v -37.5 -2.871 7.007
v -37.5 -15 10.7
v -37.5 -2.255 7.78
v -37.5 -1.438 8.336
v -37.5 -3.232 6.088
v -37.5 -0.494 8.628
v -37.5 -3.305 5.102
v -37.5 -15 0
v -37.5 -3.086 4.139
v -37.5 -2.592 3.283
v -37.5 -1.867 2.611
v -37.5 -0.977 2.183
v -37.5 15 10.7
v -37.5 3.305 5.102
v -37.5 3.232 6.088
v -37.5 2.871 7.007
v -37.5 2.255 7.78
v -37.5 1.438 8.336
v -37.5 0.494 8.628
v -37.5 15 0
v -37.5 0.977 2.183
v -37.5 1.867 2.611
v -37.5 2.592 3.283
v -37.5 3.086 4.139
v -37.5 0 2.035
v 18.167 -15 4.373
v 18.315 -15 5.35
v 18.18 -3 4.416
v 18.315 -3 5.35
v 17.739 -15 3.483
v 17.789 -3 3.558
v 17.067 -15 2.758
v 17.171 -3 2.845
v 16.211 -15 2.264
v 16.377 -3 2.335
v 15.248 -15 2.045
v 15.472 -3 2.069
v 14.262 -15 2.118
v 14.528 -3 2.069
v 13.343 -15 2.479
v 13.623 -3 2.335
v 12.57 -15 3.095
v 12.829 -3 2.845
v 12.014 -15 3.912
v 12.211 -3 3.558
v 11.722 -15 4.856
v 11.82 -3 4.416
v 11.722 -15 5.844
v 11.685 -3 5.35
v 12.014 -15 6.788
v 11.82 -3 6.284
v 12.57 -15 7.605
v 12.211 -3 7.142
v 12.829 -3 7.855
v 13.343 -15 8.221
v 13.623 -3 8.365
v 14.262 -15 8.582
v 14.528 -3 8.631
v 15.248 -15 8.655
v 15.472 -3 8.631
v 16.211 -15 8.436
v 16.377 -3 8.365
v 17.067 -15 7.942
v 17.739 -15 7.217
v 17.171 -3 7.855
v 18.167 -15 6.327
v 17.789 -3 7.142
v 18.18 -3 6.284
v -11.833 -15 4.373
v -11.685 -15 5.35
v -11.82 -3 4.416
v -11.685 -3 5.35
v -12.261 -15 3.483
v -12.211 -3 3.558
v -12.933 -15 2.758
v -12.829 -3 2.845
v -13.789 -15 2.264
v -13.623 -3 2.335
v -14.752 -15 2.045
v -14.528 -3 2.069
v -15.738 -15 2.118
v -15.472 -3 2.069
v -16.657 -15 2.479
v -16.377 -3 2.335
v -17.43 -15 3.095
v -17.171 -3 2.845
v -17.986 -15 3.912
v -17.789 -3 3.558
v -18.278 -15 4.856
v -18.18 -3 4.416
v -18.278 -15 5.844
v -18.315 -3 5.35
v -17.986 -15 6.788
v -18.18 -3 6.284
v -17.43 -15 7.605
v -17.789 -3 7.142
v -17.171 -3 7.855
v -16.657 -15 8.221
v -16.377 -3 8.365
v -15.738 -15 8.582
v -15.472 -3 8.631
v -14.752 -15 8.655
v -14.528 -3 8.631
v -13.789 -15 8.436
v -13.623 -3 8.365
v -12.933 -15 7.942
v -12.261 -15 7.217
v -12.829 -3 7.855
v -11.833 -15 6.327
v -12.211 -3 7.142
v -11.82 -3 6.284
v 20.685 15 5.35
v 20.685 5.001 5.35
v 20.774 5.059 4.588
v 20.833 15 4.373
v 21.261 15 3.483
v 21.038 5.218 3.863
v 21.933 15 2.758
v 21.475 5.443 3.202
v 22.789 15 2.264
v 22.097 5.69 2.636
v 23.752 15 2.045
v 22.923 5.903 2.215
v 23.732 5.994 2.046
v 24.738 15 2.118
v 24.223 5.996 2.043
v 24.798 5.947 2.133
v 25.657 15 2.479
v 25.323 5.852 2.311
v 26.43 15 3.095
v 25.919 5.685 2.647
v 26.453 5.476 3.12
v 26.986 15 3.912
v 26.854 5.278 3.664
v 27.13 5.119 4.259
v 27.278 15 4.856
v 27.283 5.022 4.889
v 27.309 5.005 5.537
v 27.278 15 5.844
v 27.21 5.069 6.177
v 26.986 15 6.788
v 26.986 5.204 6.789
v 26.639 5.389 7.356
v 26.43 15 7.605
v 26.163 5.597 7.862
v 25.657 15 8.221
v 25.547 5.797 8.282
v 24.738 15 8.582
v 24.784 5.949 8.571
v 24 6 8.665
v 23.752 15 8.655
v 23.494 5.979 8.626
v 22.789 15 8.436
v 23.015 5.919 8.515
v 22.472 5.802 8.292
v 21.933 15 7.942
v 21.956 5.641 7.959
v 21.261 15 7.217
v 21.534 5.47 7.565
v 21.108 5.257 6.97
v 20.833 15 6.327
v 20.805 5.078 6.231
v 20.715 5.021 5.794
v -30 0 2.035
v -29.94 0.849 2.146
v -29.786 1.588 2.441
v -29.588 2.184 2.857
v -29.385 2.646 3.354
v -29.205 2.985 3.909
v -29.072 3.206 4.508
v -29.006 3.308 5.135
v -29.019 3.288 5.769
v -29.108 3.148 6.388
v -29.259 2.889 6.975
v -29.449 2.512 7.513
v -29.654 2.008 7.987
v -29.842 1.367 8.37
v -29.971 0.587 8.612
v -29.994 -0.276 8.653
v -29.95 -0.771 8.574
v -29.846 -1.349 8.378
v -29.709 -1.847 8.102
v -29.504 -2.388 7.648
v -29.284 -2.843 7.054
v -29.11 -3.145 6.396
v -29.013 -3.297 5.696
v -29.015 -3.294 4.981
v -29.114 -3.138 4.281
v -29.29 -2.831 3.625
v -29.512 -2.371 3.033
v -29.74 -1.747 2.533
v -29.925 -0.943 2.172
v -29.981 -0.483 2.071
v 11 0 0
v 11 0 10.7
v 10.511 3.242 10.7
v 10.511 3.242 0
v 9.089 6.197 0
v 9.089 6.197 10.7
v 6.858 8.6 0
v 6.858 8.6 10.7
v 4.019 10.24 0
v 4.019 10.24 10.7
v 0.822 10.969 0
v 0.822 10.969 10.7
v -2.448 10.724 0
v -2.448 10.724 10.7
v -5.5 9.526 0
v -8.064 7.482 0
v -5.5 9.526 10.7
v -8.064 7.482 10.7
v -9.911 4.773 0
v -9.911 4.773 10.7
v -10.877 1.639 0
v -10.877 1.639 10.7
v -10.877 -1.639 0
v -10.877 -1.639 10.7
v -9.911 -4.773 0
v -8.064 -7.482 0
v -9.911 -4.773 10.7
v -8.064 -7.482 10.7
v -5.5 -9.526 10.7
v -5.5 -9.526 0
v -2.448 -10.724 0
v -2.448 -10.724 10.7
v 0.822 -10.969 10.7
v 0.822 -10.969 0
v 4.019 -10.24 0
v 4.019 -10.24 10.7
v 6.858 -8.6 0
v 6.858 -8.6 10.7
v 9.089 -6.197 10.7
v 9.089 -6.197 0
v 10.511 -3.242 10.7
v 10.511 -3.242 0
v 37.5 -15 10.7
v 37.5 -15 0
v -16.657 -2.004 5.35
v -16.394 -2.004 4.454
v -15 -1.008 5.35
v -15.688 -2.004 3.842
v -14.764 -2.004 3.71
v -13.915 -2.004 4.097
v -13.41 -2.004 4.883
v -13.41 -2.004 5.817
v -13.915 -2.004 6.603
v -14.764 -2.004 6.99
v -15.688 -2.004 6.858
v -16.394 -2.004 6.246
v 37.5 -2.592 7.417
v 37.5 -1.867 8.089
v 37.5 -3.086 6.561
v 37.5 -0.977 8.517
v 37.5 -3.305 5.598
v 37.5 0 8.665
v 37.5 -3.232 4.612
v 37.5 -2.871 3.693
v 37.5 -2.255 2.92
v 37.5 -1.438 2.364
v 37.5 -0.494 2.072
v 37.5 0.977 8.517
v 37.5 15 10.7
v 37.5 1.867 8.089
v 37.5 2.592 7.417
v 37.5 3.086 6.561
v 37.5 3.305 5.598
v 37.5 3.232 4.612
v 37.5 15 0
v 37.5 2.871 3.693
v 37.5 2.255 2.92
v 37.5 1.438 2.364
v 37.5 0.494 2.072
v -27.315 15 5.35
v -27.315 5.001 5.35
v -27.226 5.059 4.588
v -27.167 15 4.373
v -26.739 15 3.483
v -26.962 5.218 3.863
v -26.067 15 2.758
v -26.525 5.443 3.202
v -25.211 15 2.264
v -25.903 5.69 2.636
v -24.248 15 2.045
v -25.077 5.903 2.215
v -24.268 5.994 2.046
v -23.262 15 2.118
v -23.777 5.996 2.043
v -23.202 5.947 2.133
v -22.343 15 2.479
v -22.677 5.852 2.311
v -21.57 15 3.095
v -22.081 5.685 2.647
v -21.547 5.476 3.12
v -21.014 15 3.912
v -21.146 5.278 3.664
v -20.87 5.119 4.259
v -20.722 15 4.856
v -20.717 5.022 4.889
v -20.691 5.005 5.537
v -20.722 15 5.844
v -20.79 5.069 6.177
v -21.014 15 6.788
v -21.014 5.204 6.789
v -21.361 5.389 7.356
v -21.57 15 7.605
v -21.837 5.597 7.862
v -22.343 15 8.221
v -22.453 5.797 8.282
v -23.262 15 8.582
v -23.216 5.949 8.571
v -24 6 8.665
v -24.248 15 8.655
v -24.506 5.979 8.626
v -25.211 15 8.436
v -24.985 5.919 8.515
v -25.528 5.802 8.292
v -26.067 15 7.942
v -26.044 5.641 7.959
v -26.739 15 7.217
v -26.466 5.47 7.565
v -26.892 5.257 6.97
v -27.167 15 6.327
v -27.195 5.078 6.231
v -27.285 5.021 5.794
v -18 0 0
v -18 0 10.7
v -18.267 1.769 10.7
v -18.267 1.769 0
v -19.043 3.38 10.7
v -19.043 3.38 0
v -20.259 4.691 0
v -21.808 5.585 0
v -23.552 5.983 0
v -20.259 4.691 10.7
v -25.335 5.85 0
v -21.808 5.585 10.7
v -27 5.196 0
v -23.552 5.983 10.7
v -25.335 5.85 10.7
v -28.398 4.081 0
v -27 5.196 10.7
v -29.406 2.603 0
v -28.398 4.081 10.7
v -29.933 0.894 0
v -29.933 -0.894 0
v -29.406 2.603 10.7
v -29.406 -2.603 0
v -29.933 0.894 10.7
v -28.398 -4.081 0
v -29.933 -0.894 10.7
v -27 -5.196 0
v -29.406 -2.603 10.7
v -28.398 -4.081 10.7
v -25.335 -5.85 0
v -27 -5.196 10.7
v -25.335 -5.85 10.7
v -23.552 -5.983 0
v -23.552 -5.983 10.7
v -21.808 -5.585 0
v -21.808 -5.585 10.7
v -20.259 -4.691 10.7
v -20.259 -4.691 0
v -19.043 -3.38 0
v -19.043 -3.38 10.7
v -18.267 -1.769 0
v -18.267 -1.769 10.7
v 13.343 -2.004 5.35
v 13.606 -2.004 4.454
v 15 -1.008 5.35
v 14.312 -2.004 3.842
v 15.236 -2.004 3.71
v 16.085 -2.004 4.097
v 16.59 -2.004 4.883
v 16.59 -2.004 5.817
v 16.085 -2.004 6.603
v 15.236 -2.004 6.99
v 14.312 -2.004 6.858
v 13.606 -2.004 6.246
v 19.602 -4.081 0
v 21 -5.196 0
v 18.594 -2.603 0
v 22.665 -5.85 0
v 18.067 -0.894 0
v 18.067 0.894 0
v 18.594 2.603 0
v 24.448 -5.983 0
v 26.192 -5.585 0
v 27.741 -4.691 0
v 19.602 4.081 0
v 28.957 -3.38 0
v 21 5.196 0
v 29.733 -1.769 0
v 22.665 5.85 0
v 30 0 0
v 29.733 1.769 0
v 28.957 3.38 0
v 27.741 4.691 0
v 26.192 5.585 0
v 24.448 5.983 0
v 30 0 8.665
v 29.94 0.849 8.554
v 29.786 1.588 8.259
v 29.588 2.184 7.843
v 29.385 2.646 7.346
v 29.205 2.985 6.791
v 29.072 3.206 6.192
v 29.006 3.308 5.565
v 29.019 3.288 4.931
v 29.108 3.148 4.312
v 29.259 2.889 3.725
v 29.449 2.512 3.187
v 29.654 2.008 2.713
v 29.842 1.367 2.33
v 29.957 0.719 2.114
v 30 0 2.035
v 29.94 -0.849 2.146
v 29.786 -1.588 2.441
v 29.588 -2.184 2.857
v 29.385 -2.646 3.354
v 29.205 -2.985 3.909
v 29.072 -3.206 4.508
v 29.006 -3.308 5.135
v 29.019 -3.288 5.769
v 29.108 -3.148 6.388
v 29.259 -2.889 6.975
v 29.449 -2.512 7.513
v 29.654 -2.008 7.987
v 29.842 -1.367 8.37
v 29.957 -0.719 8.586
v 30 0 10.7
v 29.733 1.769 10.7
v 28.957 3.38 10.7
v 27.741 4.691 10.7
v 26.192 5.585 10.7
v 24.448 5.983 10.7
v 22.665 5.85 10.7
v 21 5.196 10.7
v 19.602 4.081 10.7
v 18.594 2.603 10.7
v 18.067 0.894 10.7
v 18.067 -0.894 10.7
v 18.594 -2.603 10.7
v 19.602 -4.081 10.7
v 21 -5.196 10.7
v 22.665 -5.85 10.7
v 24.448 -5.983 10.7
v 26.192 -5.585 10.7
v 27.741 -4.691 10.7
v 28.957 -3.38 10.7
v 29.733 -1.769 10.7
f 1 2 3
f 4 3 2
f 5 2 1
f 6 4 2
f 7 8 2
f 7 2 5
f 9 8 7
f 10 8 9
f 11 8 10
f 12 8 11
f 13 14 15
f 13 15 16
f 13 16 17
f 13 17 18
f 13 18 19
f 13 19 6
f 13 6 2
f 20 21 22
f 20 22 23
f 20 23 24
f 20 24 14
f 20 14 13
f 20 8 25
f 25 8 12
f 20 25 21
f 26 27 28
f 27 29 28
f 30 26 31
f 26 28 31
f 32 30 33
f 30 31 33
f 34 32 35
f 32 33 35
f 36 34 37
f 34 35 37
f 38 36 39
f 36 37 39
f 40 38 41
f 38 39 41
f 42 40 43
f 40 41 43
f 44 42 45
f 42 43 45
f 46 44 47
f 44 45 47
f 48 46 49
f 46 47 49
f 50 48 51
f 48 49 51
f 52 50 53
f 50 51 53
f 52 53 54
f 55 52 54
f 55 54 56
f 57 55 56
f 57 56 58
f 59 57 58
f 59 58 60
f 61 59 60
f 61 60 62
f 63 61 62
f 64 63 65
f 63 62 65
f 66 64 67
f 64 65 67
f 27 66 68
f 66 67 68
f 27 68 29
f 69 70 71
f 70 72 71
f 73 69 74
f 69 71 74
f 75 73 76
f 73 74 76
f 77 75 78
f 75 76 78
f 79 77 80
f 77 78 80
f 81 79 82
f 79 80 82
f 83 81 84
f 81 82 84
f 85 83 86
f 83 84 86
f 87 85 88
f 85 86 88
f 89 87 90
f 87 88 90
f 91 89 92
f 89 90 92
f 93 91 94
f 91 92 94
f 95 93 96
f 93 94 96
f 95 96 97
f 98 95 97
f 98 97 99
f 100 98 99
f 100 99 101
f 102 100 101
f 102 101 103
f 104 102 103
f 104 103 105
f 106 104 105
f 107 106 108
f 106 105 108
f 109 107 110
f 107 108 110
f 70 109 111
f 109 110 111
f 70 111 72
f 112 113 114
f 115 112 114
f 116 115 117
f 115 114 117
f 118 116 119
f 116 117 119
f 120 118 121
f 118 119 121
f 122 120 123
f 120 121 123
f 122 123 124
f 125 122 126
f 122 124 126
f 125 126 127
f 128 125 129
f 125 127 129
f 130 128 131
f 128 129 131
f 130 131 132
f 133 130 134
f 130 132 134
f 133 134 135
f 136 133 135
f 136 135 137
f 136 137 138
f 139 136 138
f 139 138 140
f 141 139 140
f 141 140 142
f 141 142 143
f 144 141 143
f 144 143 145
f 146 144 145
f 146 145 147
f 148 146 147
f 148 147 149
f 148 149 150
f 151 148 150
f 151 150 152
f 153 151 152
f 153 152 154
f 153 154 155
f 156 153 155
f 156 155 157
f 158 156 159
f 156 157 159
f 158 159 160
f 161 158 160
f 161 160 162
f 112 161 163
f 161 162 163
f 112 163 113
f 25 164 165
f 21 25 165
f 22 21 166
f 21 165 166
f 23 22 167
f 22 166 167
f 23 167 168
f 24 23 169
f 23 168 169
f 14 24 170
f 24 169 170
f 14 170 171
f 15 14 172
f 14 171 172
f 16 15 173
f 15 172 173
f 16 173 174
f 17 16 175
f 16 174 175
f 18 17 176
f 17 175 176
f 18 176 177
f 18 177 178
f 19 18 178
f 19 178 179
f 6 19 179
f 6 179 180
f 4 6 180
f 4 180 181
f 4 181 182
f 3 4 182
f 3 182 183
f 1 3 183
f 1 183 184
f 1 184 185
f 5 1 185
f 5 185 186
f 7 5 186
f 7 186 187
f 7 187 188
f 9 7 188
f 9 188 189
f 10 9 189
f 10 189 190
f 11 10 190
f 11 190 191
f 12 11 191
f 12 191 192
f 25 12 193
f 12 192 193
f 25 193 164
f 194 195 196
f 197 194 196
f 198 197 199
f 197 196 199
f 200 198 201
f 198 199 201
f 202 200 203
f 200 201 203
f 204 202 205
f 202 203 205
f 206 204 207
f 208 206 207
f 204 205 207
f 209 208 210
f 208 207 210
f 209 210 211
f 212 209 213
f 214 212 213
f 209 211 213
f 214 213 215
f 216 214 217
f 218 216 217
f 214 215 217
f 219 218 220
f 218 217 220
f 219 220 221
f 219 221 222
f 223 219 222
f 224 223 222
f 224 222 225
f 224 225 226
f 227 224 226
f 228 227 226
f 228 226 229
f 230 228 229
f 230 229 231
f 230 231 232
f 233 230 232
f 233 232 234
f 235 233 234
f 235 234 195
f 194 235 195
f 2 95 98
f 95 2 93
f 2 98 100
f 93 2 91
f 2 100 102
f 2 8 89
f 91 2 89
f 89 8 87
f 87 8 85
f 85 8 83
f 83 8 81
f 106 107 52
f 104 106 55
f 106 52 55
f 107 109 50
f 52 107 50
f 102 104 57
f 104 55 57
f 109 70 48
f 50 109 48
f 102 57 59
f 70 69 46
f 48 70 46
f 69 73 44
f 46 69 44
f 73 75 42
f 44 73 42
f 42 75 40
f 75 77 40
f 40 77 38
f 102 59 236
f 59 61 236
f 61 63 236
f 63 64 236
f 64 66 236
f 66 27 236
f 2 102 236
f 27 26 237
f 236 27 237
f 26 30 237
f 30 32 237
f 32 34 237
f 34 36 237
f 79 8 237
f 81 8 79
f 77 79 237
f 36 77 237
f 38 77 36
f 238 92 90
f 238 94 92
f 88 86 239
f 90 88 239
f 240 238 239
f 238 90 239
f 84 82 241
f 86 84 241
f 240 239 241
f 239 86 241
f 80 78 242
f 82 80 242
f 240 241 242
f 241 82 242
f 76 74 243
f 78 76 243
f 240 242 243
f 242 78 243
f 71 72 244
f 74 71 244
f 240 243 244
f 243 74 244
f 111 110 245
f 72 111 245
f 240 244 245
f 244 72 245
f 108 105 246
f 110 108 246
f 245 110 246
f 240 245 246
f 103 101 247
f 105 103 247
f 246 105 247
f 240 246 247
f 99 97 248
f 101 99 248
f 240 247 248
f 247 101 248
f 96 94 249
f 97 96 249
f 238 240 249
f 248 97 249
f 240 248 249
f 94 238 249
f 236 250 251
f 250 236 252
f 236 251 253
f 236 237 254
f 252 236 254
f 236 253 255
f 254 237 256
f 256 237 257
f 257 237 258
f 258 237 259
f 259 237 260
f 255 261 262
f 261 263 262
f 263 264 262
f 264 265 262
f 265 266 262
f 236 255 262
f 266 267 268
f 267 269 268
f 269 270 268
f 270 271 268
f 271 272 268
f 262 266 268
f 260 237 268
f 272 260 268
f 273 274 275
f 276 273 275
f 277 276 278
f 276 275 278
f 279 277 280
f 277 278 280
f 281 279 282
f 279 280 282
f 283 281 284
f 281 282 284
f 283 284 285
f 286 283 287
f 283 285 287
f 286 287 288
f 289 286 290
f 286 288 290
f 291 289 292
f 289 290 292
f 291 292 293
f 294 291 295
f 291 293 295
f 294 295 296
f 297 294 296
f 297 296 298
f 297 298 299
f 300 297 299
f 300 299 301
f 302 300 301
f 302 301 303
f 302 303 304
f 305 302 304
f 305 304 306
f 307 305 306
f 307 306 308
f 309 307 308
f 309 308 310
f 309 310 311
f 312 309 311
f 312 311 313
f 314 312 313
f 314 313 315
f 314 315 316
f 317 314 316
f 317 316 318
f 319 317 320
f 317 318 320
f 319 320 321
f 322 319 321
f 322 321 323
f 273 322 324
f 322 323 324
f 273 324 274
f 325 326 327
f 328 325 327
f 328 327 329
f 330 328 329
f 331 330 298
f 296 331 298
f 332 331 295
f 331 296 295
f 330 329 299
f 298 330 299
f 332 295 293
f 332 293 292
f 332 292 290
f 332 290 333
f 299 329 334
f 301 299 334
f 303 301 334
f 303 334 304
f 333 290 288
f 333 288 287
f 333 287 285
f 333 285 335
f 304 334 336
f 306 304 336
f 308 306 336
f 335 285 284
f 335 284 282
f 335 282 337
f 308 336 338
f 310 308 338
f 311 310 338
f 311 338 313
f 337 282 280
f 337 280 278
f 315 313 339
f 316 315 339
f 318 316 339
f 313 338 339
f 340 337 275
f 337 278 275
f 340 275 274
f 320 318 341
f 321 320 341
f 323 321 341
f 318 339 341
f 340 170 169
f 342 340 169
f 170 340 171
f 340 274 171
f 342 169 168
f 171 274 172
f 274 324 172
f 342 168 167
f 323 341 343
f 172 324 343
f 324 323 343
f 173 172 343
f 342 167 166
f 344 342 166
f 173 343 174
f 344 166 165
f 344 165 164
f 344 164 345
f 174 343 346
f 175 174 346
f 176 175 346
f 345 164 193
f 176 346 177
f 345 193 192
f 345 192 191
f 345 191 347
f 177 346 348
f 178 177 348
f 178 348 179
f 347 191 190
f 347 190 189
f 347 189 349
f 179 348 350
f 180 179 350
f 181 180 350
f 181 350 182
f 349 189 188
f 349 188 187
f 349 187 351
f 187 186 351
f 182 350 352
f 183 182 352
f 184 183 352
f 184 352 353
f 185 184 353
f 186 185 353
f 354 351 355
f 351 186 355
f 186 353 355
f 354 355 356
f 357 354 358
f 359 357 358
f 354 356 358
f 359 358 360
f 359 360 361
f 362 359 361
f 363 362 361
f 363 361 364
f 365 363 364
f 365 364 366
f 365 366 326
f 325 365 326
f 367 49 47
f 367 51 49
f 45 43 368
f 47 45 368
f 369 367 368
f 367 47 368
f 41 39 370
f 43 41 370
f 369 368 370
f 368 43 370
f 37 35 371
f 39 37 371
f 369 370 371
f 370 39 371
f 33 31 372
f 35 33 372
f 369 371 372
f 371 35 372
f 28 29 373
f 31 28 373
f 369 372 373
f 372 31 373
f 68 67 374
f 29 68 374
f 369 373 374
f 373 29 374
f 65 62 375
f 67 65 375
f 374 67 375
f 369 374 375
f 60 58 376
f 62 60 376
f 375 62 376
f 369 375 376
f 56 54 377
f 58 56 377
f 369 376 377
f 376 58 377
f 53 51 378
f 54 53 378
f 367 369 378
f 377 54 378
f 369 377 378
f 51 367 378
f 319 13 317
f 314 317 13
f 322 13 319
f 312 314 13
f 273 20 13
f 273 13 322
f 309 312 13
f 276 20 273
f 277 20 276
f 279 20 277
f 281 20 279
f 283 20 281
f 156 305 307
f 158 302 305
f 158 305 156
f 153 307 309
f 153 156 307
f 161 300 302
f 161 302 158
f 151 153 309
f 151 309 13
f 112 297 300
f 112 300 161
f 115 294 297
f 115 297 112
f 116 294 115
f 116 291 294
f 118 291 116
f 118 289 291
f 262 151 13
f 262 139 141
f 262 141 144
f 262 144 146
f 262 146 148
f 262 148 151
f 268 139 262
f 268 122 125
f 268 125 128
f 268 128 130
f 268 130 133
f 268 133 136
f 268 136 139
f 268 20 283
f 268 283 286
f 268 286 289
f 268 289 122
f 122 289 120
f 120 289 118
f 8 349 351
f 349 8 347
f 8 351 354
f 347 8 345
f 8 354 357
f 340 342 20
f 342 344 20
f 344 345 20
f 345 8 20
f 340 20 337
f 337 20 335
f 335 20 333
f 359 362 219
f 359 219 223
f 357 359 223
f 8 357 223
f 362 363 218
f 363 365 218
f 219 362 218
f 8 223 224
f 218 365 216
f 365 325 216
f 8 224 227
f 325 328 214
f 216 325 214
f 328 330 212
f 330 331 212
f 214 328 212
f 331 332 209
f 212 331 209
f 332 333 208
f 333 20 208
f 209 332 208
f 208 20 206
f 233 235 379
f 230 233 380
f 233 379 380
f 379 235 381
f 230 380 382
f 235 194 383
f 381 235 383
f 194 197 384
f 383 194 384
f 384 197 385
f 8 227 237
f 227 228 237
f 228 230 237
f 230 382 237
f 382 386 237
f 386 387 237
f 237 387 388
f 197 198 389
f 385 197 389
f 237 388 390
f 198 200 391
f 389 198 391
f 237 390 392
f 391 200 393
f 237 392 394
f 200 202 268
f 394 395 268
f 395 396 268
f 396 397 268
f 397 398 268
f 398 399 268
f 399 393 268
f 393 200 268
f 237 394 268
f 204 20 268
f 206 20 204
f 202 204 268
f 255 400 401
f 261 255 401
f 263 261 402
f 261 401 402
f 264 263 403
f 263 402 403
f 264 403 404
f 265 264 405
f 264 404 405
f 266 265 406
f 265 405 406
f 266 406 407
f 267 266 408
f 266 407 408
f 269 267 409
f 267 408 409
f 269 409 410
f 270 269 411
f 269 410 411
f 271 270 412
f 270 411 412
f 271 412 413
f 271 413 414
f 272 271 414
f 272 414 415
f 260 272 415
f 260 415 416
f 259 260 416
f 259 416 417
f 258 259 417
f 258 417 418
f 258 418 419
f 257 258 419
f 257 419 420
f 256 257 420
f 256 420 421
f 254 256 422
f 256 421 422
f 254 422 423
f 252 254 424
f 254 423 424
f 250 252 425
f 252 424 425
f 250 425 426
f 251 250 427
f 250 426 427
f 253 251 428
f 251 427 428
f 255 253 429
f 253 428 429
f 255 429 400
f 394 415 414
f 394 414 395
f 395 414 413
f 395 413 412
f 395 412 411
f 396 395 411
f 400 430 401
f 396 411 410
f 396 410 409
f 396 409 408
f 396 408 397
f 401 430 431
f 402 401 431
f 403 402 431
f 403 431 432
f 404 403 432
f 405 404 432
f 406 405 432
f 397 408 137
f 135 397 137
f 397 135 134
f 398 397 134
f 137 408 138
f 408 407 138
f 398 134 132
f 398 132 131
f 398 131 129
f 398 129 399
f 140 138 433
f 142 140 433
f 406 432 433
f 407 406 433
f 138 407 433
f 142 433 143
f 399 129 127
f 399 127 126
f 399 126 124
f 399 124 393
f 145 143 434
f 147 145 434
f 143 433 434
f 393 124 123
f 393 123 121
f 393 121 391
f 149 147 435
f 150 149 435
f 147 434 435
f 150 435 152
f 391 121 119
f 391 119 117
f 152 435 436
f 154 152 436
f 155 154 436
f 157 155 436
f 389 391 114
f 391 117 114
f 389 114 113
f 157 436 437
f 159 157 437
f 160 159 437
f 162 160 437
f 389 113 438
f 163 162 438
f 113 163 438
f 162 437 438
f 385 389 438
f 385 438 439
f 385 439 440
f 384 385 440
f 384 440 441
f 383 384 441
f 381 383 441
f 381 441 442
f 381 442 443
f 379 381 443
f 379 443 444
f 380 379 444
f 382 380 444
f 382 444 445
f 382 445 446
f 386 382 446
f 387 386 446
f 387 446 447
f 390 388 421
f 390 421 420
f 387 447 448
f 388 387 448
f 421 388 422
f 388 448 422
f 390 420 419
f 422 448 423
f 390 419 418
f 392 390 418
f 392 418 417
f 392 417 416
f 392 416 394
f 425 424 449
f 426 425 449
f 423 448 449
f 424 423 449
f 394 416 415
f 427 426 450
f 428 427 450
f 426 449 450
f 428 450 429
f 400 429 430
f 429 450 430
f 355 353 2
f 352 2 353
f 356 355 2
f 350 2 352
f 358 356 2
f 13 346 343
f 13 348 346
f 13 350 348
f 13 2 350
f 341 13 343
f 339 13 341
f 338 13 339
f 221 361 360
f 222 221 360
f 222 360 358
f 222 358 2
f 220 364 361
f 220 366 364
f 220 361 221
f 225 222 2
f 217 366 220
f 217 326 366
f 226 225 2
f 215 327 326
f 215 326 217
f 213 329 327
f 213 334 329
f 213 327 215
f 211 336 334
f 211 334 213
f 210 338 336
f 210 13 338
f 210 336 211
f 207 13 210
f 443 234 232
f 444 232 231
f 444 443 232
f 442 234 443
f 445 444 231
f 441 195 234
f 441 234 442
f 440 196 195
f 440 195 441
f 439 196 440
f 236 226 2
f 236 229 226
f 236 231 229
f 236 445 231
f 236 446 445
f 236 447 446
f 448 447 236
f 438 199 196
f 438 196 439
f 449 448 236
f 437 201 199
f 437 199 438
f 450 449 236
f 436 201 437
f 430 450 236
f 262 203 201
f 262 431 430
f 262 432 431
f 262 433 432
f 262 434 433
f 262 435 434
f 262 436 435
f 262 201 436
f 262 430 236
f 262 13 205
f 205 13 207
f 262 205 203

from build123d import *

# Parameters (mm, degrees)
ESBO_O1_W                                   = 75
ESBO_O1_H                                   = 30
RESSALTO_EXTRUS_O1_DEPTH                    = 10.7
ESBO_O2_R                                   = 6
CORTE_EXTRUS_O1_DEPTH                       = 11.7
ESBO_O7_R                                   = 11
CORTE_EXTRUS_O6_DEPTH                       = 11.7
FURO_ROSCADO_PARA_CONDU_TE_DE_1_4_281_D     = 6.6294
FURO_ROSCADO_PARA_CONDU_TE_DE_1_4_281_DEPTH = 15
FURO_ROSCADO_PARA_CONDU_TE_DE_1_4_281_TIP   = 1.991672694
FURO_ROSCADO_PARA_CONDU_TE_DE_1_4_282_D     = 6.6294
FURO_ROSCADO_PARA_CONDU_TE_DE_1_4_282_DEPTH = 15
FURO_ROSCADO_PARA_CONDU_TE_DE_1_4_282_TIP   = 1.991672694
FURO_ROSCADO_PARA_CONDU_TE_DE_1_4_283_D     = 6.6294
FURO_ROSCADO_PARA_CONDU_TE_DE_1_4_283_DEPTH = 15
FURO_ROSCADO_PARA_CONDU_TE_DE_1_4_283_TIP   = 1.991672694
FURO_ROSCADO_PARA_CONDU_TE_DE_1_4_284_D     = 6.6294
FURO_ROSCADO_PARA_CONDU_TE_DE_1_4_284_DEPTH = 12
FURO_ROSCADO_PARA_CONDU_TE_DE_1_4_284_TIP   = 1.991672694


with BuildPart() as part:
    # Esboço1 → Ressalto-extrusão1 (new body)
    with BuildSketch(Plane.XY):
        Rectangle(ESBO_O1_W, ESBO_O1_H)
    extrude(amount=RESSALTO_EXTRUS_O1_DEPTH)

    # Esboço2 → Corte-extrusão1 (cut, through all)
    with BuildSketch(Plane.XY.offset(10.7)):
        with Locations((-24, 0)):
            Circle(ESBO_O2_R)
        with Locations((24, 0)):
            Circle(ESBO_O2_R)
    extrude(amount=-CORTE_EXTRUS_O1_DEPTH, mode=Mode.SUBTRACT)

    # Esboço7 → Corte-extrusão6 (cut, through all)
    with BuildSketch(Plane.XY.offset(10.7)):
        Circle(ESBO_O7_R)
    extrude(amount=-CORTE_EXTRUS_O6_DEPTH, mode=Mode.SUBTRACT)

    # Furo roscado para conduíte de 1/4-281
    with Locations(Plane(origin=(0, 15, 0), x_dir=(1, 0, 0), z_dir=(0, 1, 0))):
        with Locations((-24, -5.35), (24, -5.35)):
            Hole(FURO_ROSCADO_PARA_CONDU_TE_DE_1_4_281_D / 2, depth=FURO_ROSCADO_PARA_CONDU_TE_DE_1_4_281_DEPTH)
            with Locations((0, 0, -(FURO_ROSCADO_PARA_CONDU_TE_DE_1_4_281_DEPTH + FURO_ROSCADO_PARA_CONDU_TE_DE_1_4_281_TIP / 2))):  # 118° drill point
                Cone(0, FURO_ROSCADO_PARA_CONDU_TE_DE_1_4_281_D / 2, FURO_ROSCADO_PARA_CONDU_TE_DE_1_4_281_TIP, mode=Mode.SUBTRACT)

    # Furo roscado para conduíte de 1/4-282
    with Locations(Plane.ZY.offset(37.5)):
        with Locations((5.35, 0)):
            Hole(FURO_ROSCADO_PARA_CONDU_TE_DE_1_4_282_D / 2, depth=FURO_ROSCADO_PARA_CONDU_TE_DE_1_4_282_DEPTH)
            with Locations((0, 0, -(FURO_ROSCADO_PARA_CONDU_TE_DE_1_4_282_DEPTH + FURO_ROSCADO_PARA_CONDU_TE_DE_1_4_282_TIP / 2))):  # 118° drill point
                Cone(0, FURO_ROSCADO_PARA_CONDU_TE_DE_1_4_282_D / 2, FURO_ROSCADO_PARA_CONDU_TE_DE_1_4_282_TIP, mode=Mode.SUBTRACT)

    # Furo roscado para conduíte de 1/4-283
    with Locations(Plane(origin=(37.5, 0, 0), x_dir=(0, 0, -1), z_dir=(1, 0, 0))):
        with Locations((-5.35, 0)):
            Hole(FURO_ROSCADO_PARA_CONDU_TE_DE_1_4_283_D / 2, depth=FURO_ROSCADO_PARA_CONDU_TE_DE_1_4_283_DEPTH)
            with Locations((0, 0, -(FURO_ROSCADO_PARA_CONDU_TE_DE_1_4_283_DEPTH + FURO_ROSCADO_PARA_CONDU_TE_DE_1_4_283_TIP / 2))):  # 118° drill point
                Cone(0, FURO_ROSCADO_PARA_CONDU_TE_DE_1_4_283_D / 2, FURO_ROSCADO_PARA_CONDU_TE_DE_1_4_283_TIP, mode=Mode.SUBTRACT)

    # Furo roscado para conduíte de 1/4-284
    with Locations(Plane(origin=(0, -15, 0), x_dir=(-1, 0, 0), z_dir=(0, -1, 0))):
        with Locations((15, -5.35), (-15, -5.35)):
            Hole(FURO_ROSCADO_PARA_CONDU_TE_DE_1_4_284_D / 2, depth=FURO_ROSCADO_PARA_CONDU_TE_DE_1_4_284_DEPTH)
            with Locations((0, 0, -(FURO_ROSCADO_PARA_CONDU_TE_DE_1_4_284_DEPTH + FURO_ROSCADO_PARA_CONDU_TE_DE_1_4_284_TIP / 2))):  # 118° drill point
                Cone(0, FURO_ROSCADO_PARA_CONDU_TE_DE_1_4_284_D / 2, FURO_ROSCADO_PARA_CONDU_TE_DE_1_4_284_TIP, mode=Mode.SUBTRACT)


solid = part.part
